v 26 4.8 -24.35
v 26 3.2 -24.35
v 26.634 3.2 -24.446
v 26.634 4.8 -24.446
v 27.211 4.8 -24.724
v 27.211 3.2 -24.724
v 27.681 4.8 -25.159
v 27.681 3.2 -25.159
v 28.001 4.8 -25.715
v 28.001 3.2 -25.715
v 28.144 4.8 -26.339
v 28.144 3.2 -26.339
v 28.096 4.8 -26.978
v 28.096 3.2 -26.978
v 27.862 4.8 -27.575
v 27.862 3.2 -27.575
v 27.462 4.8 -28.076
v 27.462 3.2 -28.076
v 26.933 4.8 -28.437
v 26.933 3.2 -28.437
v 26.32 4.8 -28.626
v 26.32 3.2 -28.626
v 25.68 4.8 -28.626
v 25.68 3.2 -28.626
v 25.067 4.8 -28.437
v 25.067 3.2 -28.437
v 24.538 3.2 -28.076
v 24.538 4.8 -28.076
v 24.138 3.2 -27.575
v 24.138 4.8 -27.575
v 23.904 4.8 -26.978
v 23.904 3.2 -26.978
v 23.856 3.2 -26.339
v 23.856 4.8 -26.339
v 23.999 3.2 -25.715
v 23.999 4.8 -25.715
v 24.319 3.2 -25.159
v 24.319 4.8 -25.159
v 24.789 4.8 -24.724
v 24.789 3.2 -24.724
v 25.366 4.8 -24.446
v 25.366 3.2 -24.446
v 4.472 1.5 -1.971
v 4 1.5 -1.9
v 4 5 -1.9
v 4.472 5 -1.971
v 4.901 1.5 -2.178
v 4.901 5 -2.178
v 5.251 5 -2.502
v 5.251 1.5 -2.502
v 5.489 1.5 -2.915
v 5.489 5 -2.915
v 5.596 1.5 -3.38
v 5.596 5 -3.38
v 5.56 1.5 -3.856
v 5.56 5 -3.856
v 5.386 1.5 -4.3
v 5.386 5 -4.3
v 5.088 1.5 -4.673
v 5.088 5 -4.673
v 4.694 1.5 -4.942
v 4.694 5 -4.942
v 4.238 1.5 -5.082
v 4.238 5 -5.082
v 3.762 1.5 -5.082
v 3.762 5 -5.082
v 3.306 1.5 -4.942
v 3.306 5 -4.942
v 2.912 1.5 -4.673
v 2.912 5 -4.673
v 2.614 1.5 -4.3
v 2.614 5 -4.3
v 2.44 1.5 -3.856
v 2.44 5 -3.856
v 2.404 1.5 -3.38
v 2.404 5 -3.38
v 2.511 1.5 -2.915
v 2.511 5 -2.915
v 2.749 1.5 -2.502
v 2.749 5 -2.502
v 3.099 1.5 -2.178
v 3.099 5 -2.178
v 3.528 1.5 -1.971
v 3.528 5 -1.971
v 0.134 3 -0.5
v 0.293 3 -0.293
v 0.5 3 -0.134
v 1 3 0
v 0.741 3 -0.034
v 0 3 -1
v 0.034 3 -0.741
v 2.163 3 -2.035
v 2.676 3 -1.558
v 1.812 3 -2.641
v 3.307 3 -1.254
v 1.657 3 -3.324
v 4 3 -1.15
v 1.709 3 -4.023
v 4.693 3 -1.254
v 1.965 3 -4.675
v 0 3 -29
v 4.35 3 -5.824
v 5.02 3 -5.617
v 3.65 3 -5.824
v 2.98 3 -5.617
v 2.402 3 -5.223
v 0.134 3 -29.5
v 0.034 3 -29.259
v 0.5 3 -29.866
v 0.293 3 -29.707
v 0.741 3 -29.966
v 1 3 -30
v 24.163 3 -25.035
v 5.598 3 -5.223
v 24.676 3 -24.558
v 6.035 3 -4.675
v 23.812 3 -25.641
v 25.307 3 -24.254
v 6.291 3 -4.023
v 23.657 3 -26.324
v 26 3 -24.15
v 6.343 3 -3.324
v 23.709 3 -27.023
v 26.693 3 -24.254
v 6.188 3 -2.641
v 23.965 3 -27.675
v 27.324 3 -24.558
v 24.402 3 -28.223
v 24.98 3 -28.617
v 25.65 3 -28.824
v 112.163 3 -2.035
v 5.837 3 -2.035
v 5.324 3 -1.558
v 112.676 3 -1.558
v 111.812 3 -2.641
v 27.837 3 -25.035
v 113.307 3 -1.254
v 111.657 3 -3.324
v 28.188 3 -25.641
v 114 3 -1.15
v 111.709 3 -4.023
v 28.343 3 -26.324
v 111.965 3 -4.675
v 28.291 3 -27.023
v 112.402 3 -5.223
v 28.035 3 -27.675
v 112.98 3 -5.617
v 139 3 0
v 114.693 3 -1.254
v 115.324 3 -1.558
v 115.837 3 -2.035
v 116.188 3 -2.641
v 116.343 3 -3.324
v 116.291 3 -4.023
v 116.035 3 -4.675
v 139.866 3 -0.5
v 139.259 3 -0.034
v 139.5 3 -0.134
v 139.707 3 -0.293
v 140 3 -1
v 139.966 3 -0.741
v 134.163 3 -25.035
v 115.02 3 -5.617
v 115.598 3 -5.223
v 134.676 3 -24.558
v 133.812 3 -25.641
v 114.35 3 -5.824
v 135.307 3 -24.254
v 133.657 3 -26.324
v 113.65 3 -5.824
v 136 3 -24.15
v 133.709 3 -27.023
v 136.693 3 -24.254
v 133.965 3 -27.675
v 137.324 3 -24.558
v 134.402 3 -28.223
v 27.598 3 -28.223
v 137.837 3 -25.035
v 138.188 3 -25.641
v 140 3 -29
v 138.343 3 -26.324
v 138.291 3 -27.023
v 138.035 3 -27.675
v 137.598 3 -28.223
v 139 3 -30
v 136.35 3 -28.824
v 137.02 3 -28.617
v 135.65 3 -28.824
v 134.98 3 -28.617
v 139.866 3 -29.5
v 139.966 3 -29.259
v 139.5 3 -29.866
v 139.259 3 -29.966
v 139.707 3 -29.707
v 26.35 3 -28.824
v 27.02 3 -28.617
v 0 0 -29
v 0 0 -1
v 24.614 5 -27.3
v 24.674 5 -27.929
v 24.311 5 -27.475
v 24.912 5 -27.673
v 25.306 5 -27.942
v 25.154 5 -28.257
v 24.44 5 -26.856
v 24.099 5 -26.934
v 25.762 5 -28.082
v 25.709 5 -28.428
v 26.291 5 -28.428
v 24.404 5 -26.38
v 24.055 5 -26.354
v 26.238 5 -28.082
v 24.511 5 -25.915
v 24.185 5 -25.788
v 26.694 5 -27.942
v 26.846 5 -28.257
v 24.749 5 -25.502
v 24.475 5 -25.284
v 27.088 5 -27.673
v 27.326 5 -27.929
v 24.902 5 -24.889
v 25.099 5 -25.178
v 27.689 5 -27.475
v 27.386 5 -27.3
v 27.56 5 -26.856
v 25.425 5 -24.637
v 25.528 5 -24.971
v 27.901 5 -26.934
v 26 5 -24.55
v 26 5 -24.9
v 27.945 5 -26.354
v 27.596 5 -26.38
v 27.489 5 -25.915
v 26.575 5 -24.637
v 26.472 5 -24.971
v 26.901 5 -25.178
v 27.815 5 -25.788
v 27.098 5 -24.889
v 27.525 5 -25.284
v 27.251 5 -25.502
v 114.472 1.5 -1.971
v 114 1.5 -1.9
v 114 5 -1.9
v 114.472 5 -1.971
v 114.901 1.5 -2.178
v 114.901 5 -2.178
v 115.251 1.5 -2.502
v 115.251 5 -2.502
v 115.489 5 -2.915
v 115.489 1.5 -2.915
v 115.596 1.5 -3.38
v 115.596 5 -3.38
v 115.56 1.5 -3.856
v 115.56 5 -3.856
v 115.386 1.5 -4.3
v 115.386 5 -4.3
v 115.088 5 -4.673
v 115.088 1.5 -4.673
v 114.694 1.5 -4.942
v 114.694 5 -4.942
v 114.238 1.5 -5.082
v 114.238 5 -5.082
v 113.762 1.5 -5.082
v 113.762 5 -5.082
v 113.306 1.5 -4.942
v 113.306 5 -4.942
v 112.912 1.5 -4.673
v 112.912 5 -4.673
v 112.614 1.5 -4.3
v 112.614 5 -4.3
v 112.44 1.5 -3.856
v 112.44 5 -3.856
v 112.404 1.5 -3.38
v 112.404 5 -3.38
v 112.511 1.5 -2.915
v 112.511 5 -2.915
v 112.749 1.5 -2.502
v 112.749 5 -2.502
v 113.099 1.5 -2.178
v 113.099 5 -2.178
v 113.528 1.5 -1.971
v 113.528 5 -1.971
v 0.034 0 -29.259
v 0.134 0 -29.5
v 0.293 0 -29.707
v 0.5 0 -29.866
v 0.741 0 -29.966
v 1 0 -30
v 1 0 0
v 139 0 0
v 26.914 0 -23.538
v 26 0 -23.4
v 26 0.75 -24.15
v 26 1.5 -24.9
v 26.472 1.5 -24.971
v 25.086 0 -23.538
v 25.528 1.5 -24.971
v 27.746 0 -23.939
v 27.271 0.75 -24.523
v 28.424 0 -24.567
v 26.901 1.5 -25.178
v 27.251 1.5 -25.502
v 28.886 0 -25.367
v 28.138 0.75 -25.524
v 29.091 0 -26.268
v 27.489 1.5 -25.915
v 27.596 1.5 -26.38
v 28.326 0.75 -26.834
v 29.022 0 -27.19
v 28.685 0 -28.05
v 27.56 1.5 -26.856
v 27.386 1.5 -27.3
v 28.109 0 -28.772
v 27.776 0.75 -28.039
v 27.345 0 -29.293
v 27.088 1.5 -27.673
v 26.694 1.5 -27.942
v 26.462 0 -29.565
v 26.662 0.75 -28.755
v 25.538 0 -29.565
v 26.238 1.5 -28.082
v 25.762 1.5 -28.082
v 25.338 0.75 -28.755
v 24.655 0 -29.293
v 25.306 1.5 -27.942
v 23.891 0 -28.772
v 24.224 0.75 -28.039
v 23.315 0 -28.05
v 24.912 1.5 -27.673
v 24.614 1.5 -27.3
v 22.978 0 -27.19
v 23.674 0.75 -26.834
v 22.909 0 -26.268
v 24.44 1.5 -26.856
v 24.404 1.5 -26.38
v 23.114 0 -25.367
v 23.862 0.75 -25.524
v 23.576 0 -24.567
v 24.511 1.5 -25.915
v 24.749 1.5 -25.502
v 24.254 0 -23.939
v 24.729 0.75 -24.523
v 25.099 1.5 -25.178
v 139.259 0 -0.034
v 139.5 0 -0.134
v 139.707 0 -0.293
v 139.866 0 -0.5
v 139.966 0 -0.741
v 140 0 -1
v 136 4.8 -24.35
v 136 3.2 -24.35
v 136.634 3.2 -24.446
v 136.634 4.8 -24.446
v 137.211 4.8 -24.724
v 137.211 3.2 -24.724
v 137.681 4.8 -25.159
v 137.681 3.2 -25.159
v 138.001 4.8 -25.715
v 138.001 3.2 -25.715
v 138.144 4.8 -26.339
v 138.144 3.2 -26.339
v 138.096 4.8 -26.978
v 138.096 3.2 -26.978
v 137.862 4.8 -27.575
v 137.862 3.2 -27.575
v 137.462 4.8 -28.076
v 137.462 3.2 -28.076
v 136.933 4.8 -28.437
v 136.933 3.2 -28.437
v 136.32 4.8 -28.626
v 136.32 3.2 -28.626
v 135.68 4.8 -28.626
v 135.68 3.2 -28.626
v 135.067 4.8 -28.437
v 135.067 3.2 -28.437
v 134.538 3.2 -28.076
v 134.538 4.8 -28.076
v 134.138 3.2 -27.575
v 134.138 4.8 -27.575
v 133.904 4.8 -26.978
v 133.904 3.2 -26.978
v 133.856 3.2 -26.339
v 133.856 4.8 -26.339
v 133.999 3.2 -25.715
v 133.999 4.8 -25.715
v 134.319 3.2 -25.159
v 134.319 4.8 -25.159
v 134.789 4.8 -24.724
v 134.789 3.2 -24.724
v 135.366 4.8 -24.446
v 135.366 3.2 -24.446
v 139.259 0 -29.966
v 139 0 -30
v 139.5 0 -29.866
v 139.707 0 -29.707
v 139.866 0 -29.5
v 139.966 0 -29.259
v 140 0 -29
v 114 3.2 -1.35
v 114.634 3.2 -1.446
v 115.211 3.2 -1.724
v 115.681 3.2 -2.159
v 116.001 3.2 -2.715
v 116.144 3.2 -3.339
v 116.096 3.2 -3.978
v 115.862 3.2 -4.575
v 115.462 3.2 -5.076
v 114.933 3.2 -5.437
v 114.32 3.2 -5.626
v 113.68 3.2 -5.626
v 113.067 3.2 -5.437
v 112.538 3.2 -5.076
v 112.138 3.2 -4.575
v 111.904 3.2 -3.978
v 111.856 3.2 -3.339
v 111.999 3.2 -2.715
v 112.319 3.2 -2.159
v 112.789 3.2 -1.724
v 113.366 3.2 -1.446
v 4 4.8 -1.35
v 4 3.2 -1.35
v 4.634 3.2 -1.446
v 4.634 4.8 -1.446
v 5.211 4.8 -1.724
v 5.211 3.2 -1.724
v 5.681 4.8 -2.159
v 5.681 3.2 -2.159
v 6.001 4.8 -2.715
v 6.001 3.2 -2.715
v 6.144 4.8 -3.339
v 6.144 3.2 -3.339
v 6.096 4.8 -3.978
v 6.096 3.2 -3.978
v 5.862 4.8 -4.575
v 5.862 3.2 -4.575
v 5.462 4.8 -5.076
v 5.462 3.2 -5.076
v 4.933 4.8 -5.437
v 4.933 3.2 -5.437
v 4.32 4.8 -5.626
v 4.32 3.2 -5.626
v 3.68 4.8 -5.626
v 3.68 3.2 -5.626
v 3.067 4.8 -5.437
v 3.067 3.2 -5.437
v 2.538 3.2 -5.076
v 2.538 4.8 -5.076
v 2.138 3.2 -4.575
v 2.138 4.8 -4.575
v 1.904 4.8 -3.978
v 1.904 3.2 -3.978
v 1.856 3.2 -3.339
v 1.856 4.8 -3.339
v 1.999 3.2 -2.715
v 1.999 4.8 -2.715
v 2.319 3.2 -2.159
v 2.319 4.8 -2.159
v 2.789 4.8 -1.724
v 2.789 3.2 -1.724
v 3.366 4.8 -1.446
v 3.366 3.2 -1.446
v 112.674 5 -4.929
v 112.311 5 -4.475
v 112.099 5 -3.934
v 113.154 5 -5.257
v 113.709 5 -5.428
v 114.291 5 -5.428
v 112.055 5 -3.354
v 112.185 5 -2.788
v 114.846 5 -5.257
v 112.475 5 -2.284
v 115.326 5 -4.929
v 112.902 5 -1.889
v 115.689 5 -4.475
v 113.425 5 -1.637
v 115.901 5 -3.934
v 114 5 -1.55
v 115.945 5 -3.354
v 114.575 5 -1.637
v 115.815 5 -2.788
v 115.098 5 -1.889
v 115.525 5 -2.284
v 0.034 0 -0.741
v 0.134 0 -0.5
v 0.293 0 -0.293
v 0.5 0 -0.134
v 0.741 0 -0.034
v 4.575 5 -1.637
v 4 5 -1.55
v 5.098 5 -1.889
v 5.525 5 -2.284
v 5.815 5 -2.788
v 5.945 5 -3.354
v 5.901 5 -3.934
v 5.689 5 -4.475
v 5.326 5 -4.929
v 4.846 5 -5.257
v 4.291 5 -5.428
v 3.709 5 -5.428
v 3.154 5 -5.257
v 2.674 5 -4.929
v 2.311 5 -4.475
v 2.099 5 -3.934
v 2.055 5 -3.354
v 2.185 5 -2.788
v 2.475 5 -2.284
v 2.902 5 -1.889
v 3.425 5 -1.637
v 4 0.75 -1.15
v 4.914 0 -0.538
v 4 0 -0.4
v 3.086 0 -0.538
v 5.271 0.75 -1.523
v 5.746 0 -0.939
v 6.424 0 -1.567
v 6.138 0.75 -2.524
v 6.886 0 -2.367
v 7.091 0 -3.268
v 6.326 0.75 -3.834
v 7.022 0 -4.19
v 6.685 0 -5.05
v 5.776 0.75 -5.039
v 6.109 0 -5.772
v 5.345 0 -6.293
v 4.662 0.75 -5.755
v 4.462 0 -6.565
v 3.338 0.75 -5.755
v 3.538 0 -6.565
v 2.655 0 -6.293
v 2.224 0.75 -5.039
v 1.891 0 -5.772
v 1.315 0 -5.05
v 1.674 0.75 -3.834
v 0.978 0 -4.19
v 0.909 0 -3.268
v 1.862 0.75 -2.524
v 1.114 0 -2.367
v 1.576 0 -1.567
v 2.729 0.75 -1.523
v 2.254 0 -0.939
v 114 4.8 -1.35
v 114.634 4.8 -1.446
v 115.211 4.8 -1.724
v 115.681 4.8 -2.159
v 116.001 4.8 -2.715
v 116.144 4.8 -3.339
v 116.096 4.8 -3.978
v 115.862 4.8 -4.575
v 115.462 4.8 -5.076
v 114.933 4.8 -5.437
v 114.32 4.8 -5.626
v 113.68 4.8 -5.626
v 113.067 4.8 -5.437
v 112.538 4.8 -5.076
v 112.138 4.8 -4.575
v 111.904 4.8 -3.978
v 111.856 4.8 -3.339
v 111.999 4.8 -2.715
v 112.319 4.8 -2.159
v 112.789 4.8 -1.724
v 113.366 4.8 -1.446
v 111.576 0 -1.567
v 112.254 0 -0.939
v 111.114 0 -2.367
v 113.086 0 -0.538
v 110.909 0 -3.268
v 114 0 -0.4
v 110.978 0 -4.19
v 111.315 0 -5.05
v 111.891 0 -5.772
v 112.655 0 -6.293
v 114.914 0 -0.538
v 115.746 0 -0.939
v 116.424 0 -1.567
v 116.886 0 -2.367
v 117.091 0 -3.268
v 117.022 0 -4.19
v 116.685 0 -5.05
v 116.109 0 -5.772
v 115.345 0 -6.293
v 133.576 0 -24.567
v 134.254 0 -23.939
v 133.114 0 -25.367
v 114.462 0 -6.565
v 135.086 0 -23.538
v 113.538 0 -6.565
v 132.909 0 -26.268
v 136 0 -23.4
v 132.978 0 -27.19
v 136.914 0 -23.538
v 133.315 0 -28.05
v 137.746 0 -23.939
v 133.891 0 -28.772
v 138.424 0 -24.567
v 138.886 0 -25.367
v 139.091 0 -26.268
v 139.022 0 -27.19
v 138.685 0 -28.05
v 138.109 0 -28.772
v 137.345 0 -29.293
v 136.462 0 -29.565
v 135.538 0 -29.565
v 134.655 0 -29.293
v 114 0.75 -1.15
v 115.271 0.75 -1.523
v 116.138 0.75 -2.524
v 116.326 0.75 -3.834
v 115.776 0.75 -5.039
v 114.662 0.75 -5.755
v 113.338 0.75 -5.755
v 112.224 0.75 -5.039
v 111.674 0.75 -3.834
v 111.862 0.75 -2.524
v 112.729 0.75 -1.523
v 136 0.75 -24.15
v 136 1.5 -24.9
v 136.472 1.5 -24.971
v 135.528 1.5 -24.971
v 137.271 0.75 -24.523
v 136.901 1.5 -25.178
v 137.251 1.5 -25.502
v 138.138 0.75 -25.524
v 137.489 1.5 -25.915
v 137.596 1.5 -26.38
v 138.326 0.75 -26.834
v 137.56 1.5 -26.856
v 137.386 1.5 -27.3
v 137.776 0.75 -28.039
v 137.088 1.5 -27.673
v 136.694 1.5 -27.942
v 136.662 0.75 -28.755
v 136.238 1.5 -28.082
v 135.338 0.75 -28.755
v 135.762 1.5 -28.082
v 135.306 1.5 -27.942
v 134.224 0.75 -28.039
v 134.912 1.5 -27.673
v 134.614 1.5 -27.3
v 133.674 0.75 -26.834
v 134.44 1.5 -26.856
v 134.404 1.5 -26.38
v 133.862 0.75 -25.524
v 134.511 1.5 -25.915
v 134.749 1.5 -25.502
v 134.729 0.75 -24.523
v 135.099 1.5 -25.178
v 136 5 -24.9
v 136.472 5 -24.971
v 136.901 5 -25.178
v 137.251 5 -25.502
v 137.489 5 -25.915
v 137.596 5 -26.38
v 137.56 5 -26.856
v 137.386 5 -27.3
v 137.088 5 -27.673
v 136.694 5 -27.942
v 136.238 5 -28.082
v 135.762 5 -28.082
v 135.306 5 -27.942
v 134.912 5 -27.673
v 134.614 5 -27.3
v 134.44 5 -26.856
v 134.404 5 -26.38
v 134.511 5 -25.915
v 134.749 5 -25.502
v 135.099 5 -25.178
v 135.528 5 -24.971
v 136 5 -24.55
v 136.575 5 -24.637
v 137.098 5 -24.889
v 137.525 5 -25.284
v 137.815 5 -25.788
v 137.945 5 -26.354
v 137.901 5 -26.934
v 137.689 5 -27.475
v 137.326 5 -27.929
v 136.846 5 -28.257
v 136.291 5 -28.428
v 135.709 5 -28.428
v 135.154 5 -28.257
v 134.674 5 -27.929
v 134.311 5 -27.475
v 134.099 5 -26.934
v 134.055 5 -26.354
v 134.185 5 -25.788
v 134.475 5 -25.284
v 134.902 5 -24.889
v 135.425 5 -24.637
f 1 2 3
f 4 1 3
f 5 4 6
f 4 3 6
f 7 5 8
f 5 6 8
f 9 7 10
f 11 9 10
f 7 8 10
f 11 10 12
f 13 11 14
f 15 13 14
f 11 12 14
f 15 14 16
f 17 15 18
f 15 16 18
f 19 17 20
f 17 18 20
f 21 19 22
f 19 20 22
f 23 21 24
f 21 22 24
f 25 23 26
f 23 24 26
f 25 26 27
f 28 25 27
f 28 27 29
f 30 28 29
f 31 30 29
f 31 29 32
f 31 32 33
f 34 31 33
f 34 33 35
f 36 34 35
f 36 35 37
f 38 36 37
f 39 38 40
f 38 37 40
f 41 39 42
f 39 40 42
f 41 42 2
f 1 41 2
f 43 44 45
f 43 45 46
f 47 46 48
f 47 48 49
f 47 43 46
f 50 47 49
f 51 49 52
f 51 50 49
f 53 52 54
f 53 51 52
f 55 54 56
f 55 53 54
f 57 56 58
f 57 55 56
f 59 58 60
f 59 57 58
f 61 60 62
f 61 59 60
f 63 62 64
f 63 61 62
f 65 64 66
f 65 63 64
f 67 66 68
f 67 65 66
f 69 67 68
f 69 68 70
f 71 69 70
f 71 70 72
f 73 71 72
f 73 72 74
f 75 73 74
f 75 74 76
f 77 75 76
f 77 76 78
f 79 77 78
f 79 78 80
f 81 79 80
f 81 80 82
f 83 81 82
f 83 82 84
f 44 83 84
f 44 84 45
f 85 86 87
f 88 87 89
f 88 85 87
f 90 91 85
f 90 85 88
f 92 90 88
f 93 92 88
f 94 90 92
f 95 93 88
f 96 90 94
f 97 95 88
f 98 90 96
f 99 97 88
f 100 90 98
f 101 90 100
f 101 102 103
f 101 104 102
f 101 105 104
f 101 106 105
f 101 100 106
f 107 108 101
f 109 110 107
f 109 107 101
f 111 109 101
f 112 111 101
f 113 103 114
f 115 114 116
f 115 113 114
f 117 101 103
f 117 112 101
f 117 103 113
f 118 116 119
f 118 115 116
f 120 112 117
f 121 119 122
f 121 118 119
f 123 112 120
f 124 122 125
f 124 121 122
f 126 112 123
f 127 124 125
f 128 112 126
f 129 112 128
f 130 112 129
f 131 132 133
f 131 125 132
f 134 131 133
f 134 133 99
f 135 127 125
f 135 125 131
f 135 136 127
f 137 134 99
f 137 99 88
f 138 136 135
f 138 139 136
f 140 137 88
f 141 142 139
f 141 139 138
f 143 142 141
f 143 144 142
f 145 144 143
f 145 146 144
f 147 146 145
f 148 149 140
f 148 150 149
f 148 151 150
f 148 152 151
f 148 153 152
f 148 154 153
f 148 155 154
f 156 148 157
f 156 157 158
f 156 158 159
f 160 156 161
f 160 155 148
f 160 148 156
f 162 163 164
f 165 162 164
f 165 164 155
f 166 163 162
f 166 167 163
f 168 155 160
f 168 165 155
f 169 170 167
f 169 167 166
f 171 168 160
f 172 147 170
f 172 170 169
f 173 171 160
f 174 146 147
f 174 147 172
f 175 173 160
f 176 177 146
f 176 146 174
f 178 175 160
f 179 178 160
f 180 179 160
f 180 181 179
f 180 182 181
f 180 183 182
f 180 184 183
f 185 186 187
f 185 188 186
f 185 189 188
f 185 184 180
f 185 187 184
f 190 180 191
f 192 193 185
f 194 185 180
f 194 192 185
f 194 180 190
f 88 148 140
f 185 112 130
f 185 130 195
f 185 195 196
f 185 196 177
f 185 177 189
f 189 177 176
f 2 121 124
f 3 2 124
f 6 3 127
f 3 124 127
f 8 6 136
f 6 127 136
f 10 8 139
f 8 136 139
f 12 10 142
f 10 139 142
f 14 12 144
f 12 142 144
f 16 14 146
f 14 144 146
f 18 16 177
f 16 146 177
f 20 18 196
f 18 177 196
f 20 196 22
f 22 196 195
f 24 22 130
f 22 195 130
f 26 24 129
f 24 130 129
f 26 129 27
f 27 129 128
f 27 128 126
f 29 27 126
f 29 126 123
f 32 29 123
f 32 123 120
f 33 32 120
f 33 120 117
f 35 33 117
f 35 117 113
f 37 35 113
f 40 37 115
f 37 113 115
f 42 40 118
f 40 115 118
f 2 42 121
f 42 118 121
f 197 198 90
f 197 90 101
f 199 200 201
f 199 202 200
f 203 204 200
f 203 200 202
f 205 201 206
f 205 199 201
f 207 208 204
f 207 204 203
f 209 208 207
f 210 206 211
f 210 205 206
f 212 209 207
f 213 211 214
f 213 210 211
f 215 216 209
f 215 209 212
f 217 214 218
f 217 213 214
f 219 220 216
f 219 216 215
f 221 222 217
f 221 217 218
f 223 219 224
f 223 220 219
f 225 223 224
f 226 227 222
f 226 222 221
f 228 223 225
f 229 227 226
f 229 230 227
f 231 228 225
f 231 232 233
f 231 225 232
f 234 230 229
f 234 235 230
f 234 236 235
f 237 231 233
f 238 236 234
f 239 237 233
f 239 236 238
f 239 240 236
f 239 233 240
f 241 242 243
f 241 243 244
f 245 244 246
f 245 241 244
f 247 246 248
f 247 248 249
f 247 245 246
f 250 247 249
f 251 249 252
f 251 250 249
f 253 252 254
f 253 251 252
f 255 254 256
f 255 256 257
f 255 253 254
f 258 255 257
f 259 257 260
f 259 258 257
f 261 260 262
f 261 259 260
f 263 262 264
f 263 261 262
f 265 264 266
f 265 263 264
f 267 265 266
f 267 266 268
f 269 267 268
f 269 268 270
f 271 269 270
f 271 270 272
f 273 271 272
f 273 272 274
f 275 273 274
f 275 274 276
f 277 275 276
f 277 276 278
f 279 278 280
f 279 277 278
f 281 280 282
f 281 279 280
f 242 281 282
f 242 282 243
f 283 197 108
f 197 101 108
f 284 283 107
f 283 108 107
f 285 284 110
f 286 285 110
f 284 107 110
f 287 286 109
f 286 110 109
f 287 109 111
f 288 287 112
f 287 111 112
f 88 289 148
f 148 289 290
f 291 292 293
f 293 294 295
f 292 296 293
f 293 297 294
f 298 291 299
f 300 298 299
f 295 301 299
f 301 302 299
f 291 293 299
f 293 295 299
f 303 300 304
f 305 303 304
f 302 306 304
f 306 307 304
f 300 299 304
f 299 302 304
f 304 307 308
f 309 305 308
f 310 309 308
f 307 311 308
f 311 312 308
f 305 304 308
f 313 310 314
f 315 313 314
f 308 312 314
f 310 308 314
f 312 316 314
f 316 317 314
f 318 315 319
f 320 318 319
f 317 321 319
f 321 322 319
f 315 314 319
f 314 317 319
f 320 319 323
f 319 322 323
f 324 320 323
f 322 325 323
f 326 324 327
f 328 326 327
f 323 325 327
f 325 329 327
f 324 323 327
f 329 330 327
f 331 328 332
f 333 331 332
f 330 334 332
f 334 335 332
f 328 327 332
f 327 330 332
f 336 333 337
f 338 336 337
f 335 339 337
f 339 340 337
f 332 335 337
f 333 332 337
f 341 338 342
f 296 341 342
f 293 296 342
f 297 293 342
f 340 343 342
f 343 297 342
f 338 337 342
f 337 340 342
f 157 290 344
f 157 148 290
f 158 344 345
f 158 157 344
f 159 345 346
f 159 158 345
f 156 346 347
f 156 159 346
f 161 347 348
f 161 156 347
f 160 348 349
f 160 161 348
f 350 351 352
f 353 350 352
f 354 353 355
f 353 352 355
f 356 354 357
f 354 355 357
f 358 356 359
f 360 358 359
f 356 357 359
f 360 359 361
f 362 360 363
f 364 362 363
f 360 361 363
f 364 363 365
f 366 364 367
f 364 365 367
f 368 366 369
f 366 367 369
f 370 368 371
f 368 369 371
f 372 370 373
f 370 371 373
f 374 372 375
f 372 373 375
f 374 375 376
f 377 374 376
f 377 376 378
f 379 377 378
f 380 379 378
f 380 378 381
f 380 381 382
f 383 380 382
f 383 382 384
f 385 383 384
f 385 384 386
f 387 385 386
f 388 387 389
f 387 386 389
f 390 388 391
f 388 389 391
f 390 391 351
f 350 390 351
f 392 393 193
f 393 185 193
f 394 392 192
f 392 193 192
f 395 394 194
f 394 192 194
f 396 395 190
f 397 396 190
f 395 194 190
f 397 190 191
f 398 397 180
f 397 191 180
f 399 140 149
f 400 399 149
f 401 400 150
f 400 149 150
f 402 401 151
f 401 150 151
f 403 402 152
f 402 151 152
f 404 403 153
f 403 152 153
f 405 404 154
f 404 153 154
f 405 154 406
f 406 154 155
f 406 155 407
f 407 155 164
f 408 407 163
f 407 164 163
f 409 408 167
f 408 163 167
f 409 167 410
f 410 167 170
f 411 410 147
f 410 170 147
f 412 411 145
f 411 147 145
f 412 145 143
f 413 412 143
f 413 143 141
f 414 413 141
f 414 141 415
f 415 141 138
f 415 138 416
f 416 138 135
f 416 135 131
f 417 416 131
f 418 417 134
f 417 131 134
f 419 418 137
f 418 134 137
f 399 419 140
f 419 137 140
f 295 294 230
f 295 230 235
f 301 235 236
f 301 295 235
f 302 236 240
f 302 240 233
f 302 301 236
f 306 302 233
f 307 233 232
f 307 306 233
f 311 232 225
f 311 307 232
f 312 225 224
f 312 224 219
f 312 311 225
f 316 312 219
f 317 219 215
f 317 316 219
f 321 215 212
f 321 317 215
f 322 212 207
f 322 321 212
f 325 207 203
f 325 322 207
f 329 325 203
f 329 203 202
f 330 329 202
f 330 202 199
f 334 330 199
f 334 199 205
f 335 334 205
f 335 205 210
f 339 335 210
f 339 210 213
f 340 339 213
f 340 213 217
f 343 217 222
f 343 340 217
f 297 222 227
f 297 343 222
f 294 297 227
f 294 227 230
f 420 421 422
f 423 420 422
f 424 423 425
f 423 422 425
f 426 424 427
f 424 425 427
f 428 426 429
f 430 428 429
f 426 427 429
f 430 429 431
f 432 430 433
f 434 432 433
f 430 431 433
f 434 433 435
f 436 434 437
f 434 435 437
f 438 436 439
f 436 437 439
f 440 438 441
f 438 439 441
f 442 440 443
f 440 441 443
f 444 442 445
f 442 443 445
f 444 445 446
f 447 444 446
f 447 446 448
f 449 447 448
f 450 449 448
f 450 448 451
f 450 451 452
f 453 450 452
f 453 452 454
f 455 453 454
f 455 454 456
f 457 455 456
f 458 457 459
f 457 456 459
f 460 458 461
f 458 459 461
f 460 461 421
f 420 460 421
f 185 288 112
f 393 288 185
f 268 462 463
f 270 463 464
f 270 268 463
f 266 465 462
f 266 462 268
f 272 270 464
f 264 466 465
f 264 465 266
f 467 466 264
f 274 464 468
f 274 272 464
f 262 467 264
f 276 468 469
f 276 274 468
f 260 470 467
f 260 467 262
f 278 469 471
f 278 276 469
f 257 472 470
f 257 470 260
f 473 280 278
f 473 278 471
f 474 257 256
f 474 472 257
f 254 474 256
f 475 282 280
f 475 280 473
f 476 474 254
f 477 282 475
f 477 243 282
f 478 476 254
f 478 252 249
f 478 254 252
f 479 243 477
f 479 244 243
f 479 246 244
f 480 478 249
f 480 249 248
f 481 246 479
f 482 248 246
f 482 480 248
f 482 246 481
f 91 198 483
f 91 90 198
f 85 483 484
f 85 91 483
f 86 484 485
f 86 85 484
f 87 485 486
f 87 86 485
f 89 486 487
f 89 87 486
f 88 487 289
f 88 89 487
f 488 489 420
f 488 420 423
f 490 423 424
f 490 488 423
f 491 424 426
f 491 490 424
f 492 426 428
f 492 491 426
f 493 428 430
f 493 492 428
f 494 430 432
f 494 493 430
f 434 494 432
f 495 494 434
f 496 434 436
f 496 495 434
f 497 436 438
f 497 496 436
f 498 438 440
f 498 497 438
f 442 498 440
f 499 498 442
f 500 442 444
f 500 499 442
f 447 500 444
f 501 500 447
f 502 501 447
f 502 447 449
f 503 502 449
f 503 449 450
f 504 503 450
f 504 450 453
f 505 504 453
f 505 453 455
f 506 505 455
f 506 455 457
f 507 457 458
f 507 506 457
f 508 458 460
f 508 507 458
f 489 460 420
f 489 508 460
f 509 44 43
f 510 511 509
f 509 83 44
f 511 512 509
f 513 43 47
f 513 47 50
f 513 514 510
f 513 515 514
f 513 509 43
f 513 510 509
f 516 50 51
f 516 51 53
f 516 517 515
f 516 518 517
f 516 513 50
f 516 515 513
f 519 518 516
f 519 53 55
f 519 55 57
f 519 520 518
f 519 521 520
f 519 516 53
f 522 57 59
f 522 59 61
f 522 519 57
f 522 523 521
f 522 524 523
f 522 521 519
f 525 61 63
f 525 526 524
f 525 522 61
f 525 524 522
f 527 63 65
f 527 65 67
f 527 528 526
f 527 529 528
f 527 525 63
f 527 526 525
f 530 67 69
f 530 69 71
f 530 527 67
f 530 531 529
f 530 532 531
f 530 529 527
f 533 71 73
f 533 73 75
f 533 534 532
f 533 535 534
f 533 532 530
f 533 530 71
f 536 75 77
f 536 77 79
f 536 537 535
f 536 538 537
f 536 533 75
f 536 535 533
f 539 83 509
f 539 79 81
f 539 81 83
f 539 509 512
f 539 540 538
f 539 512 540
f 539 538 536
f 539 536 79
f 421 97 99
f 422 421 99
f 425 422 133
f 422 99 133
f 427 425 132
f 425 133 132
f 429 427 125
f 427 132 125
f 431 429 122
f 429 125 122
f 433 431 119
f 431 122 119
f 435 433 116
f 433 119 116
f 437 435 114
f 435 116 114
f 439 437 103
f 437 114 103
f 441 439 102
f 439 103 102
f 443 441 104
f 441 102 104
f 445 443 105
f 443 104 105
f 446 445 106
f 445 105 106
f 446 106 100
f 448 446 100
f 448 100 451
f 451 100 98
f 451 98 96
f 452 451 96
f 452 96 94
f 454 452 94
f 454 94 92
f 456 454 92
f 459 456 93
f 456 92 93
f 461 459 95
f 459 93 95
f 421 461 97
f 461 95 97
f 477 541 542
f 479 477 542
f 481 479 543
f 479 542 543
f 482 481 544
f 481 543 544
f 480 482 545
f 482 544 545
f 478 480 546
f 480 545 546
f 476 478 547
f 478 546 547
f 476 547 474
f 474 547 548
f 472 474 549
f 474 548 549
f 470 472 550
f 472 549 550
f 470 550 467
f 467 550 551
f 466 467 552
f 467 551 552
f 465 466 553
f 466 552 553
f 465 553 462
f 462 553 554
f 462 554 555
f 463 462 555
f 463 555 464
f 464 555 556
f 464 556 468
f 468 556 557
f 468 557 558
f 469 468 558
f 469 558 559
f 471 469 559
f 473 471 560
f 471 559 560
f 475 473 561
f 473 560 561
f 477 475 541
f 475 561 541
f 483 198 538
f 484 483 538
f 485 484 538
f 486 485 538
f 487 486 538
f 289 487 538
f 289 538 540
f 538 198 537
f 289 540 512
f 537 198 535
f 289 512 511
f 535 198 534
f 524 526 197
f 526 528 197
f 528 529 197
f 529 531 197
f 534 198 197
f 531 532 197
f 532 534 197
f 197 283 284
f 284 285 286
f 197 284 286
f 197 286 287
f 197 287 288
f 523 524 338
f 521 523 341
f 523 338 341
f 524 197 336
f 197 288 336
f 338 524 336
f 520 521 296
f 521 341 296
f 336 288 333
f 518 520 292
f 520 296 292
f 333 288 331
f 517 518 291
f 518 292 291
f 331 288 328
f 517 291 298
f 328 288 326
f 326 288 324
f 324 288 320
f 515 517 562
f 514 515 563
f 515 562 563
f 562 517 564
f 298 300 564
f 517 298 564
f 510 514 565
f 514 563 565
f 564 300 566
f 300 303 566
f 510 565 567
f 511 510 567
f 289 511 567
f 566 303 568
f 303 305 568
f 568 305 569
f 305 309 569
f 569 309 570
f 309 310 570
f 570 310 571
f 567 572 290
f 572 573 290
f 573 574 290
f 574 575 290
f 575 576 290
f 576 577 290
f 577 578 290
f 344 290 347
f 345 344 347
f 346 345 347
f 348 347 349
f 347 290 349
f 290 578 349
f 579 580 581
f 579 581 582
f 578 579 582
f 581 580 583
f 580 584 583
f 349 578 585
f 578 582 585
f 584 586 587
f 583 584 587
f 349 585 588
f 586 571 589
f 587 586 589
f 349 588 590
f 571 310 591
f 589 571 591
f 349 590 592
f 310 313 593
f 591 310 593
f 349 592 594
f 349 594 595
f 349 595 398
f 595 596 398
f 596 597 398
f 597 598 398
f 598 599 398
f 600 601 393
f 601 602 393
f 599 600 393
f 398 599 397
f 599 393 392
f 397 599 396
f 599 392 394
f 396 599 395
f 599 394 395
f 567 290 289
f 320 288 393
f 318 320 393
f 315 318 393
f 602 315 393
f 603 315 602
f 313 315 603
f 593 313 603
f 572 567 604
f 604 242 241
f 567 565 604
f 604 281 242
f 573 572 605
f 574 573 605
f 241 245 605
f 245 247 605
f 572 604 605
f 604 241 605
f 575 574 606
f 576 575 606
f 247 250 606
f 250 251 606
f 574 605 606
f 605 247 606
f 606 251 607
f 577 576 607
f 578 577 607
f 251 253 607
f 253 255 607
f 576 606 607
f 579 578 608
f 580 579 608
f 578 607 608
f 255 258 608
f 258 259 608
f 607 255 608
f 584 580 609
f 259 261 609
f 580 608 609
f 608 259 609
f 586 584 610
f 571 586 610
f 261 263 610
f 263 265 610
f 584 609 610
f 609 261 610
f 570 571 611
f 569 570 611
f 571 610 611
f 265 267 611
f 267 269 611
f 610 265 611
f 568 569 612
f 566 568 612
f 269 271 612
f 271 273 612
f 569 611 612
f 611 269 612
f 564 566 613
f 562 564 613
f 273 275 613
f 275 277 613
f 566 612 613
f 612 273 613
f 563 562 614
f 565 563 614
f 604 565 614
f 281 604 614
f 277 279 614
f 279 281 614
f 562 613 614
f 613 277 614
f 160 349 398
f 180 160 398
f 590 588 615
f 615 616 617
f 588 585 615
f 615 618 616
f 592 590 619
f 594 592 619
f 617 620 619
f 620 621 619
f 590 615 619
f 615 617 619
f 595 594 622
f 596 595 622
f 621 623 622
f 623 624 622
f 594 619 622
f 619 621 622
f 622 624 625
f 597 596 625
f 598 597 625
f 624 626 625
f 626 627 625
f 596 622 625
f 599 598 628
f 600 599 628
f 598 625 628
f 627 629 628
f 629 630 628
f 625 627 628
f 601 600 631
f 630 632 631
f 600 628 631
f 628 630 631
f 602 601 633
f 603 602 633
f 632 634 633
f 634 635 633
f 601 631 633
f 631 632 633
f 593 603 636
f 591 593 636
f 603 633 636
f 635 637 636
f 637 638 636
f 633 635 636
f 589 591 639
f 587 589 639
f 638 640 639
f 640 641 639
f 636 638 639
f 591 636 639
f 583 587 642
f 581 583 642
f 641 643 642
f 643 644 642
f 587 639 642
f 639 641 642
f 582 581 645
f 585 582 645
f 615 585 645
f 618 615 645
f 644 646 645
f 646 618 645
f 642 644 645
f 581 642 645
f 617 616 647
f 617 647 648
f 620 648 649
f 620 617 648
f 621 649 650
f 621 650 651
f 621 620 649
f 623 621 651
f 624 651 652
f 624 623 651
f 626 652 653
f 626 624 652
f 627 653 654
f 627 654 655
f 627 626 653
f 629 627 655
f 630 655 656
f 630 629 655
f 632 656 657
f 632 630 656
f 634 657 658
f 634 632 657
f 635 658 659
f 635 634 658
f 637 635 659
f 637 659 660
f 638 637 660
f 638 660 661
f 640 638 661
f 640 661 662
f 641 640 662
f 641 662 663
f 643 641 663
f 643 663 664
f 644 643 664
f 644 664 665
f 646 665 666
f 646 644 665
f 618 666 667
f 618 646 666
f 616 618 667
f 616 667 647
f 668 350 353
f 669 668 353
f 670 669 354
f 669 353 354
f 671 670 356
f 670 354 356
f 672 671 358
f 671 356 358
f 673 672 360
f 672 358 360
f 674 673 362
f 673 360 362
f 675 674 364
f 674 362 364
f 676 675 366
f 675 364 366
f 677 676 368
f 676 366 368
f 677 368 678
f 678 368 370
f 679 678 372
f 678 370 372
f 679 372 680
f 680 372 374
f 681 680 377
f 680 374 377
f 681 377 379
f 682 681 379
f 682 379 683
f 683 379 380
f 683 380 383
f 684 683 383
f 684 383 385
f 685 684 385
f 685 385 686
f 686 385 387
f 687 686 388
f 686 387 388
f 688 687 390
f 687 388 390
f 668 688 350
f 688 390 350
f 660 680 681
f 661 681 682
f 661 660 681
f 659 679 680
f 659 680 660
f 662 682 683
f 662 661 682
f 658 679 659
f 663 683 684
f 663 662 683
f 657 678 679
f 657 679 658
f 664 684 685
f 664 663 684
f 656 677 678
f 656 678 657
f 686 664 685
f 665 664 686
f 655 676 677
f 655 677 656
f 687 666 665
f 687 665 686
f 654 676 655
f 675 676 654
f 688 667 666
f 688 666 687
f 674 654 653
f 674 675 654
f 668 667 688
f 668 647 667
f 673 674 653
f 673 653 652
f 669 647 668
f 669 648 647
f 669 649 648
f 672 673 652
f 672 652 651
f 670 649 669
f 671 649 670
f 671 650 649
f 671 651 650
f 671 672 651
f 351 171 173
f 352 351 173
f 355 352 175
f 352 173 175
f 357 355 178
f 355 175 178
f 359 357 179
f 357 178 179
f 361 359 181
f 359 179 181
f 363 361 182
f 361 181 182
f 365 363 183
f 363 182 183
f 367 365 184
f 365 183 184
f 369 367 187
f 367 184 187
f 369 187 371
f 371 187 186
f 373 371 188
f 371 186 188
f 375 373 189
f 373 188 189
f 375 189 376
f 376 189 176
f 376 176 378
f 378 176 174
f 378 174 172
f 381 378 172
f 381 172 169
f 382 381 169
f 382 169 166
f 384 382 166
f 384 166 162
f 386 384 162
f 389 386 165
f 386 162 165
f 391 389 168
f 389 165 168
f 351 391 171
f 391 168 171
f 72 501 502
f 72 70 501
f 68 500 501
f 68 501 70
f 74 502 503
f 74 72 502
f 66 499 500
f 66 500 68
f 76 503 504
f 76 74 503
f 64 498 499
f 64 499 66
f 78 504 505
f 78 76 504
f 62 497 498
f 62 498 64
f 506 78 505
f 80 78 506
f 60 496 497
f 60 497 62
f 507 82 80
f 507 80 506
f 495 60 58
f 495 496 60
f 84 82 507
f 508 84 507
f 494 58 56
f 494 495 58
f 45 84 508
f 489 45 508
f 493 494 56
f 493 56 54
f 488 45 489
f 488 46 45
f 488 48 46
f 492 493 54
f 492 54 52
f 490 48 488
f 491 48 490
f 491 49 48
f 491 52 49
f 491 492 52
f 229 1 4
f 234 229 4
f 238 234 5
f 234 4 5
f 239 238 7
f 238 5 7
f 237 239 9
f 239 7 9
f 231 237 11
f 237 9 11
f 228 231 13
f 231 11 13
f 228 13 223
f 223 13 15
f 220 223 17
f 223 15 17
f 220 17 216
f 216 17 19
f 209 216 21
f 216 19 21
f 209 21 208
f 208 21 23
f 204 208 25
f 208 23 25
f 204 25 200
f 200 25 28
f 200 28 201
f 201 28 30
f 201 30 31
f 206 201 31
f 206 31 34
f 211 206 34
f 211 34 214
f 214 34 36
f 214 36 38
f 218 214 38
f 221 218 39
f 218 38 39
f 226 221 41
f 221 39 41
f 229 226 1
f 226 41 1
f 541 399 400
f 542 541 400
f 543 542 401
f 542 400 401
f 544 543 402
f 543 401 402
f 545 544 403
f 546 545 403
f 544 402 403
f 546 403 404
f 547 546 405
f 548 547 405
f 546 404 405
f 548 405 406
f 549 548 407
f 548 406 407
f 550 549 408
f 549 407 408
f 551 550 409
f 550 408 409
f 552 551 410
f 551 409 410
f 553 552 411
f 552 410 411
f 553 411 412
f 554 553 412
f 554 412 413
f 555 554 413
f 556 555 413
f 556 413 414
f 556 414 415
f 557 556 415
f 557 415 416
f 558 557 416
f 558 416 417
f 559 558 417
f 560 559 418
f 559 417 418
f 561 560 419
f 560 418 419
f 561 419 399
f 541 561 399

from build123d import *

# Parameters (mm, degrees)
ESQUISSE1_W        = 140
ESQUISSE1_H        = 30
ESQUISSE1_R        = 1.6
BOSS_EXTRU_1_DEPTH = 3
ESQUISSE2_R        = 2.15
ESQUISSE2_R_2      = 1.6
BOSS_EXTRU_2_DEPTH = 2
CHANFREIN1_SIZE    = 0.2
CHANFREIN2_SIZE    = 1.5
CONG_1_R           = 1


with BuildPart() as part:
    # Esquisse1 → Boss.-Extru.1 (new body)
    with BuildSketch(Plane(origin=(0, 0, 0), x_dir=(1, 0, 0), z_dir=(0, 1, 0))):
        with Locations((70, 15)):
            Rectangle(ESQUISSE1_W, ESQUISSE1_H)
        with Locations(Location((4, 3.5, 0), (0, 0, 270))):
            Circle(ESQUISSE1_R, mode=Mode.SUBTRACT)
        with Locations(Location((26, 26.5, 0), (0, 0, 270))):
            Circle(ESQUISSE1_R, mode=Mode.SUBTRACT)
        with Locations(Location((114, 3.5, 0), (0, 0, 270))):
            Circle(ESQUISSE1_R, mode=Mode.SUBTRACT)
        with Locations(Location((136, 26.5, 0), (0, 0, 270))):
            Circle(ESQUISSE1_R, mode=Mode.SUBTRACT)
    extrude(amount=BOSS_EXTRU_1_DEPTH)

    # Esquisse2 → Boss.-Extru.2 (add)
    # profile 1 of 4: a face of its own
    with BuildSketch(Plane(origin=(0, 3, 0), x_dir=(1, 0, 0), z_dir=(0, 1, 0))):
        with Locations(Location((4, 3.5, 0), (0, 0, 270))):
            Circle(ESQUISSE2_R)
        with Locations(Location((4, 3.5, 0), (0, 0, 270))):
            Circle(ESQUISSE2_R_2, mode=Mode.SUBTRACT)
    # profile 2 of 4: a face of its own
    with BuildSketch(Plane(origin=(0, 3, 0), x_dir=(1, 0, 0), z_dir=(0, 1, 0))):
        with Locations(Location((26, 26.5, 0), (0, 0, 270))):
            Circle(ESQUISSE2_R)
        with Locations(Location((26, 26.5, 0), (0, 0, 270))):
            Circle(ESQUISSE2_R_2, mode=Mode.SUBTRACT)
    # profile 3 of 4: a face of its own
    with BuildSketch(Plane(origin=(0, 3, 0), x_dir=(1, 0, 0), z_dir=(0, 1, 0))):
        with Locations(Location((114, 3.5, 0), (0, 0, 270))):
            Circle(ESQUISSE2_R)
        with Locations(Location((114, 3.5, 0), (0, 0, 270))):
            Circle(ESQUISSE2_R_2, mode=Mode.SUBTRACT)
    # profile 4 of 4: a face of its own
    with BuildSketch(Plane(origin=(0, 3, 0), x_dir=(1, 0, 0), z_dir=(0, 1, 0))):
        with Locations(Location((136, 26.5, 0), (0, 0, 270))):
            Circle(ESQUISSE2_R)
        with Locations(Location((136, 26.5, 0), (0, 0, 270))):
            Circle(ESQUISSE2_R_2, mode=Mode.SUBTRACT)
    extrude(amount=BOSS_EXTRU_2_DEPTH)

    # Chanfrein1
    chanfrein1_edges = [part.edges().sort_by_distance(p)[0] for p in [
        (4, 5, -5.65),
        (4, 3, -5.65),
        (26, 5, -28.65),
        (26, 3, -28.65),
        (114, 5, -5.65),
        (114, 3, -5.65),
        (136, 5, -28.65),
        (136, 3, -28.65),
    ]]
    chamfer(chanfrein1_edges, length=CHANFREIN1_SIZE)

    # Chanfrein2
    chanfrein2_edges = [part.edges().sort_by_distance(p)[0] for p in [
        (4, 0, -5.1),
        (26, 0, -28.1),
        (114, 0, -5.1),
        (136, 0, -28.1),
    ]]
    chamfer(chanfrein2_edges, length=CHANFREIN2_SIZE)

    # Congé1
    cong_1_edges = [part.edges().sort_by_distance(p)[0] for p in [
        (0, 1.5, -30),
        (140, 1.5, -30),
        (140, 1.5, 0),
        (0, 1.5, 0),
    ]]
    fillet(cong_1_edges, radius=CONG_1_R)


solid = part.part
